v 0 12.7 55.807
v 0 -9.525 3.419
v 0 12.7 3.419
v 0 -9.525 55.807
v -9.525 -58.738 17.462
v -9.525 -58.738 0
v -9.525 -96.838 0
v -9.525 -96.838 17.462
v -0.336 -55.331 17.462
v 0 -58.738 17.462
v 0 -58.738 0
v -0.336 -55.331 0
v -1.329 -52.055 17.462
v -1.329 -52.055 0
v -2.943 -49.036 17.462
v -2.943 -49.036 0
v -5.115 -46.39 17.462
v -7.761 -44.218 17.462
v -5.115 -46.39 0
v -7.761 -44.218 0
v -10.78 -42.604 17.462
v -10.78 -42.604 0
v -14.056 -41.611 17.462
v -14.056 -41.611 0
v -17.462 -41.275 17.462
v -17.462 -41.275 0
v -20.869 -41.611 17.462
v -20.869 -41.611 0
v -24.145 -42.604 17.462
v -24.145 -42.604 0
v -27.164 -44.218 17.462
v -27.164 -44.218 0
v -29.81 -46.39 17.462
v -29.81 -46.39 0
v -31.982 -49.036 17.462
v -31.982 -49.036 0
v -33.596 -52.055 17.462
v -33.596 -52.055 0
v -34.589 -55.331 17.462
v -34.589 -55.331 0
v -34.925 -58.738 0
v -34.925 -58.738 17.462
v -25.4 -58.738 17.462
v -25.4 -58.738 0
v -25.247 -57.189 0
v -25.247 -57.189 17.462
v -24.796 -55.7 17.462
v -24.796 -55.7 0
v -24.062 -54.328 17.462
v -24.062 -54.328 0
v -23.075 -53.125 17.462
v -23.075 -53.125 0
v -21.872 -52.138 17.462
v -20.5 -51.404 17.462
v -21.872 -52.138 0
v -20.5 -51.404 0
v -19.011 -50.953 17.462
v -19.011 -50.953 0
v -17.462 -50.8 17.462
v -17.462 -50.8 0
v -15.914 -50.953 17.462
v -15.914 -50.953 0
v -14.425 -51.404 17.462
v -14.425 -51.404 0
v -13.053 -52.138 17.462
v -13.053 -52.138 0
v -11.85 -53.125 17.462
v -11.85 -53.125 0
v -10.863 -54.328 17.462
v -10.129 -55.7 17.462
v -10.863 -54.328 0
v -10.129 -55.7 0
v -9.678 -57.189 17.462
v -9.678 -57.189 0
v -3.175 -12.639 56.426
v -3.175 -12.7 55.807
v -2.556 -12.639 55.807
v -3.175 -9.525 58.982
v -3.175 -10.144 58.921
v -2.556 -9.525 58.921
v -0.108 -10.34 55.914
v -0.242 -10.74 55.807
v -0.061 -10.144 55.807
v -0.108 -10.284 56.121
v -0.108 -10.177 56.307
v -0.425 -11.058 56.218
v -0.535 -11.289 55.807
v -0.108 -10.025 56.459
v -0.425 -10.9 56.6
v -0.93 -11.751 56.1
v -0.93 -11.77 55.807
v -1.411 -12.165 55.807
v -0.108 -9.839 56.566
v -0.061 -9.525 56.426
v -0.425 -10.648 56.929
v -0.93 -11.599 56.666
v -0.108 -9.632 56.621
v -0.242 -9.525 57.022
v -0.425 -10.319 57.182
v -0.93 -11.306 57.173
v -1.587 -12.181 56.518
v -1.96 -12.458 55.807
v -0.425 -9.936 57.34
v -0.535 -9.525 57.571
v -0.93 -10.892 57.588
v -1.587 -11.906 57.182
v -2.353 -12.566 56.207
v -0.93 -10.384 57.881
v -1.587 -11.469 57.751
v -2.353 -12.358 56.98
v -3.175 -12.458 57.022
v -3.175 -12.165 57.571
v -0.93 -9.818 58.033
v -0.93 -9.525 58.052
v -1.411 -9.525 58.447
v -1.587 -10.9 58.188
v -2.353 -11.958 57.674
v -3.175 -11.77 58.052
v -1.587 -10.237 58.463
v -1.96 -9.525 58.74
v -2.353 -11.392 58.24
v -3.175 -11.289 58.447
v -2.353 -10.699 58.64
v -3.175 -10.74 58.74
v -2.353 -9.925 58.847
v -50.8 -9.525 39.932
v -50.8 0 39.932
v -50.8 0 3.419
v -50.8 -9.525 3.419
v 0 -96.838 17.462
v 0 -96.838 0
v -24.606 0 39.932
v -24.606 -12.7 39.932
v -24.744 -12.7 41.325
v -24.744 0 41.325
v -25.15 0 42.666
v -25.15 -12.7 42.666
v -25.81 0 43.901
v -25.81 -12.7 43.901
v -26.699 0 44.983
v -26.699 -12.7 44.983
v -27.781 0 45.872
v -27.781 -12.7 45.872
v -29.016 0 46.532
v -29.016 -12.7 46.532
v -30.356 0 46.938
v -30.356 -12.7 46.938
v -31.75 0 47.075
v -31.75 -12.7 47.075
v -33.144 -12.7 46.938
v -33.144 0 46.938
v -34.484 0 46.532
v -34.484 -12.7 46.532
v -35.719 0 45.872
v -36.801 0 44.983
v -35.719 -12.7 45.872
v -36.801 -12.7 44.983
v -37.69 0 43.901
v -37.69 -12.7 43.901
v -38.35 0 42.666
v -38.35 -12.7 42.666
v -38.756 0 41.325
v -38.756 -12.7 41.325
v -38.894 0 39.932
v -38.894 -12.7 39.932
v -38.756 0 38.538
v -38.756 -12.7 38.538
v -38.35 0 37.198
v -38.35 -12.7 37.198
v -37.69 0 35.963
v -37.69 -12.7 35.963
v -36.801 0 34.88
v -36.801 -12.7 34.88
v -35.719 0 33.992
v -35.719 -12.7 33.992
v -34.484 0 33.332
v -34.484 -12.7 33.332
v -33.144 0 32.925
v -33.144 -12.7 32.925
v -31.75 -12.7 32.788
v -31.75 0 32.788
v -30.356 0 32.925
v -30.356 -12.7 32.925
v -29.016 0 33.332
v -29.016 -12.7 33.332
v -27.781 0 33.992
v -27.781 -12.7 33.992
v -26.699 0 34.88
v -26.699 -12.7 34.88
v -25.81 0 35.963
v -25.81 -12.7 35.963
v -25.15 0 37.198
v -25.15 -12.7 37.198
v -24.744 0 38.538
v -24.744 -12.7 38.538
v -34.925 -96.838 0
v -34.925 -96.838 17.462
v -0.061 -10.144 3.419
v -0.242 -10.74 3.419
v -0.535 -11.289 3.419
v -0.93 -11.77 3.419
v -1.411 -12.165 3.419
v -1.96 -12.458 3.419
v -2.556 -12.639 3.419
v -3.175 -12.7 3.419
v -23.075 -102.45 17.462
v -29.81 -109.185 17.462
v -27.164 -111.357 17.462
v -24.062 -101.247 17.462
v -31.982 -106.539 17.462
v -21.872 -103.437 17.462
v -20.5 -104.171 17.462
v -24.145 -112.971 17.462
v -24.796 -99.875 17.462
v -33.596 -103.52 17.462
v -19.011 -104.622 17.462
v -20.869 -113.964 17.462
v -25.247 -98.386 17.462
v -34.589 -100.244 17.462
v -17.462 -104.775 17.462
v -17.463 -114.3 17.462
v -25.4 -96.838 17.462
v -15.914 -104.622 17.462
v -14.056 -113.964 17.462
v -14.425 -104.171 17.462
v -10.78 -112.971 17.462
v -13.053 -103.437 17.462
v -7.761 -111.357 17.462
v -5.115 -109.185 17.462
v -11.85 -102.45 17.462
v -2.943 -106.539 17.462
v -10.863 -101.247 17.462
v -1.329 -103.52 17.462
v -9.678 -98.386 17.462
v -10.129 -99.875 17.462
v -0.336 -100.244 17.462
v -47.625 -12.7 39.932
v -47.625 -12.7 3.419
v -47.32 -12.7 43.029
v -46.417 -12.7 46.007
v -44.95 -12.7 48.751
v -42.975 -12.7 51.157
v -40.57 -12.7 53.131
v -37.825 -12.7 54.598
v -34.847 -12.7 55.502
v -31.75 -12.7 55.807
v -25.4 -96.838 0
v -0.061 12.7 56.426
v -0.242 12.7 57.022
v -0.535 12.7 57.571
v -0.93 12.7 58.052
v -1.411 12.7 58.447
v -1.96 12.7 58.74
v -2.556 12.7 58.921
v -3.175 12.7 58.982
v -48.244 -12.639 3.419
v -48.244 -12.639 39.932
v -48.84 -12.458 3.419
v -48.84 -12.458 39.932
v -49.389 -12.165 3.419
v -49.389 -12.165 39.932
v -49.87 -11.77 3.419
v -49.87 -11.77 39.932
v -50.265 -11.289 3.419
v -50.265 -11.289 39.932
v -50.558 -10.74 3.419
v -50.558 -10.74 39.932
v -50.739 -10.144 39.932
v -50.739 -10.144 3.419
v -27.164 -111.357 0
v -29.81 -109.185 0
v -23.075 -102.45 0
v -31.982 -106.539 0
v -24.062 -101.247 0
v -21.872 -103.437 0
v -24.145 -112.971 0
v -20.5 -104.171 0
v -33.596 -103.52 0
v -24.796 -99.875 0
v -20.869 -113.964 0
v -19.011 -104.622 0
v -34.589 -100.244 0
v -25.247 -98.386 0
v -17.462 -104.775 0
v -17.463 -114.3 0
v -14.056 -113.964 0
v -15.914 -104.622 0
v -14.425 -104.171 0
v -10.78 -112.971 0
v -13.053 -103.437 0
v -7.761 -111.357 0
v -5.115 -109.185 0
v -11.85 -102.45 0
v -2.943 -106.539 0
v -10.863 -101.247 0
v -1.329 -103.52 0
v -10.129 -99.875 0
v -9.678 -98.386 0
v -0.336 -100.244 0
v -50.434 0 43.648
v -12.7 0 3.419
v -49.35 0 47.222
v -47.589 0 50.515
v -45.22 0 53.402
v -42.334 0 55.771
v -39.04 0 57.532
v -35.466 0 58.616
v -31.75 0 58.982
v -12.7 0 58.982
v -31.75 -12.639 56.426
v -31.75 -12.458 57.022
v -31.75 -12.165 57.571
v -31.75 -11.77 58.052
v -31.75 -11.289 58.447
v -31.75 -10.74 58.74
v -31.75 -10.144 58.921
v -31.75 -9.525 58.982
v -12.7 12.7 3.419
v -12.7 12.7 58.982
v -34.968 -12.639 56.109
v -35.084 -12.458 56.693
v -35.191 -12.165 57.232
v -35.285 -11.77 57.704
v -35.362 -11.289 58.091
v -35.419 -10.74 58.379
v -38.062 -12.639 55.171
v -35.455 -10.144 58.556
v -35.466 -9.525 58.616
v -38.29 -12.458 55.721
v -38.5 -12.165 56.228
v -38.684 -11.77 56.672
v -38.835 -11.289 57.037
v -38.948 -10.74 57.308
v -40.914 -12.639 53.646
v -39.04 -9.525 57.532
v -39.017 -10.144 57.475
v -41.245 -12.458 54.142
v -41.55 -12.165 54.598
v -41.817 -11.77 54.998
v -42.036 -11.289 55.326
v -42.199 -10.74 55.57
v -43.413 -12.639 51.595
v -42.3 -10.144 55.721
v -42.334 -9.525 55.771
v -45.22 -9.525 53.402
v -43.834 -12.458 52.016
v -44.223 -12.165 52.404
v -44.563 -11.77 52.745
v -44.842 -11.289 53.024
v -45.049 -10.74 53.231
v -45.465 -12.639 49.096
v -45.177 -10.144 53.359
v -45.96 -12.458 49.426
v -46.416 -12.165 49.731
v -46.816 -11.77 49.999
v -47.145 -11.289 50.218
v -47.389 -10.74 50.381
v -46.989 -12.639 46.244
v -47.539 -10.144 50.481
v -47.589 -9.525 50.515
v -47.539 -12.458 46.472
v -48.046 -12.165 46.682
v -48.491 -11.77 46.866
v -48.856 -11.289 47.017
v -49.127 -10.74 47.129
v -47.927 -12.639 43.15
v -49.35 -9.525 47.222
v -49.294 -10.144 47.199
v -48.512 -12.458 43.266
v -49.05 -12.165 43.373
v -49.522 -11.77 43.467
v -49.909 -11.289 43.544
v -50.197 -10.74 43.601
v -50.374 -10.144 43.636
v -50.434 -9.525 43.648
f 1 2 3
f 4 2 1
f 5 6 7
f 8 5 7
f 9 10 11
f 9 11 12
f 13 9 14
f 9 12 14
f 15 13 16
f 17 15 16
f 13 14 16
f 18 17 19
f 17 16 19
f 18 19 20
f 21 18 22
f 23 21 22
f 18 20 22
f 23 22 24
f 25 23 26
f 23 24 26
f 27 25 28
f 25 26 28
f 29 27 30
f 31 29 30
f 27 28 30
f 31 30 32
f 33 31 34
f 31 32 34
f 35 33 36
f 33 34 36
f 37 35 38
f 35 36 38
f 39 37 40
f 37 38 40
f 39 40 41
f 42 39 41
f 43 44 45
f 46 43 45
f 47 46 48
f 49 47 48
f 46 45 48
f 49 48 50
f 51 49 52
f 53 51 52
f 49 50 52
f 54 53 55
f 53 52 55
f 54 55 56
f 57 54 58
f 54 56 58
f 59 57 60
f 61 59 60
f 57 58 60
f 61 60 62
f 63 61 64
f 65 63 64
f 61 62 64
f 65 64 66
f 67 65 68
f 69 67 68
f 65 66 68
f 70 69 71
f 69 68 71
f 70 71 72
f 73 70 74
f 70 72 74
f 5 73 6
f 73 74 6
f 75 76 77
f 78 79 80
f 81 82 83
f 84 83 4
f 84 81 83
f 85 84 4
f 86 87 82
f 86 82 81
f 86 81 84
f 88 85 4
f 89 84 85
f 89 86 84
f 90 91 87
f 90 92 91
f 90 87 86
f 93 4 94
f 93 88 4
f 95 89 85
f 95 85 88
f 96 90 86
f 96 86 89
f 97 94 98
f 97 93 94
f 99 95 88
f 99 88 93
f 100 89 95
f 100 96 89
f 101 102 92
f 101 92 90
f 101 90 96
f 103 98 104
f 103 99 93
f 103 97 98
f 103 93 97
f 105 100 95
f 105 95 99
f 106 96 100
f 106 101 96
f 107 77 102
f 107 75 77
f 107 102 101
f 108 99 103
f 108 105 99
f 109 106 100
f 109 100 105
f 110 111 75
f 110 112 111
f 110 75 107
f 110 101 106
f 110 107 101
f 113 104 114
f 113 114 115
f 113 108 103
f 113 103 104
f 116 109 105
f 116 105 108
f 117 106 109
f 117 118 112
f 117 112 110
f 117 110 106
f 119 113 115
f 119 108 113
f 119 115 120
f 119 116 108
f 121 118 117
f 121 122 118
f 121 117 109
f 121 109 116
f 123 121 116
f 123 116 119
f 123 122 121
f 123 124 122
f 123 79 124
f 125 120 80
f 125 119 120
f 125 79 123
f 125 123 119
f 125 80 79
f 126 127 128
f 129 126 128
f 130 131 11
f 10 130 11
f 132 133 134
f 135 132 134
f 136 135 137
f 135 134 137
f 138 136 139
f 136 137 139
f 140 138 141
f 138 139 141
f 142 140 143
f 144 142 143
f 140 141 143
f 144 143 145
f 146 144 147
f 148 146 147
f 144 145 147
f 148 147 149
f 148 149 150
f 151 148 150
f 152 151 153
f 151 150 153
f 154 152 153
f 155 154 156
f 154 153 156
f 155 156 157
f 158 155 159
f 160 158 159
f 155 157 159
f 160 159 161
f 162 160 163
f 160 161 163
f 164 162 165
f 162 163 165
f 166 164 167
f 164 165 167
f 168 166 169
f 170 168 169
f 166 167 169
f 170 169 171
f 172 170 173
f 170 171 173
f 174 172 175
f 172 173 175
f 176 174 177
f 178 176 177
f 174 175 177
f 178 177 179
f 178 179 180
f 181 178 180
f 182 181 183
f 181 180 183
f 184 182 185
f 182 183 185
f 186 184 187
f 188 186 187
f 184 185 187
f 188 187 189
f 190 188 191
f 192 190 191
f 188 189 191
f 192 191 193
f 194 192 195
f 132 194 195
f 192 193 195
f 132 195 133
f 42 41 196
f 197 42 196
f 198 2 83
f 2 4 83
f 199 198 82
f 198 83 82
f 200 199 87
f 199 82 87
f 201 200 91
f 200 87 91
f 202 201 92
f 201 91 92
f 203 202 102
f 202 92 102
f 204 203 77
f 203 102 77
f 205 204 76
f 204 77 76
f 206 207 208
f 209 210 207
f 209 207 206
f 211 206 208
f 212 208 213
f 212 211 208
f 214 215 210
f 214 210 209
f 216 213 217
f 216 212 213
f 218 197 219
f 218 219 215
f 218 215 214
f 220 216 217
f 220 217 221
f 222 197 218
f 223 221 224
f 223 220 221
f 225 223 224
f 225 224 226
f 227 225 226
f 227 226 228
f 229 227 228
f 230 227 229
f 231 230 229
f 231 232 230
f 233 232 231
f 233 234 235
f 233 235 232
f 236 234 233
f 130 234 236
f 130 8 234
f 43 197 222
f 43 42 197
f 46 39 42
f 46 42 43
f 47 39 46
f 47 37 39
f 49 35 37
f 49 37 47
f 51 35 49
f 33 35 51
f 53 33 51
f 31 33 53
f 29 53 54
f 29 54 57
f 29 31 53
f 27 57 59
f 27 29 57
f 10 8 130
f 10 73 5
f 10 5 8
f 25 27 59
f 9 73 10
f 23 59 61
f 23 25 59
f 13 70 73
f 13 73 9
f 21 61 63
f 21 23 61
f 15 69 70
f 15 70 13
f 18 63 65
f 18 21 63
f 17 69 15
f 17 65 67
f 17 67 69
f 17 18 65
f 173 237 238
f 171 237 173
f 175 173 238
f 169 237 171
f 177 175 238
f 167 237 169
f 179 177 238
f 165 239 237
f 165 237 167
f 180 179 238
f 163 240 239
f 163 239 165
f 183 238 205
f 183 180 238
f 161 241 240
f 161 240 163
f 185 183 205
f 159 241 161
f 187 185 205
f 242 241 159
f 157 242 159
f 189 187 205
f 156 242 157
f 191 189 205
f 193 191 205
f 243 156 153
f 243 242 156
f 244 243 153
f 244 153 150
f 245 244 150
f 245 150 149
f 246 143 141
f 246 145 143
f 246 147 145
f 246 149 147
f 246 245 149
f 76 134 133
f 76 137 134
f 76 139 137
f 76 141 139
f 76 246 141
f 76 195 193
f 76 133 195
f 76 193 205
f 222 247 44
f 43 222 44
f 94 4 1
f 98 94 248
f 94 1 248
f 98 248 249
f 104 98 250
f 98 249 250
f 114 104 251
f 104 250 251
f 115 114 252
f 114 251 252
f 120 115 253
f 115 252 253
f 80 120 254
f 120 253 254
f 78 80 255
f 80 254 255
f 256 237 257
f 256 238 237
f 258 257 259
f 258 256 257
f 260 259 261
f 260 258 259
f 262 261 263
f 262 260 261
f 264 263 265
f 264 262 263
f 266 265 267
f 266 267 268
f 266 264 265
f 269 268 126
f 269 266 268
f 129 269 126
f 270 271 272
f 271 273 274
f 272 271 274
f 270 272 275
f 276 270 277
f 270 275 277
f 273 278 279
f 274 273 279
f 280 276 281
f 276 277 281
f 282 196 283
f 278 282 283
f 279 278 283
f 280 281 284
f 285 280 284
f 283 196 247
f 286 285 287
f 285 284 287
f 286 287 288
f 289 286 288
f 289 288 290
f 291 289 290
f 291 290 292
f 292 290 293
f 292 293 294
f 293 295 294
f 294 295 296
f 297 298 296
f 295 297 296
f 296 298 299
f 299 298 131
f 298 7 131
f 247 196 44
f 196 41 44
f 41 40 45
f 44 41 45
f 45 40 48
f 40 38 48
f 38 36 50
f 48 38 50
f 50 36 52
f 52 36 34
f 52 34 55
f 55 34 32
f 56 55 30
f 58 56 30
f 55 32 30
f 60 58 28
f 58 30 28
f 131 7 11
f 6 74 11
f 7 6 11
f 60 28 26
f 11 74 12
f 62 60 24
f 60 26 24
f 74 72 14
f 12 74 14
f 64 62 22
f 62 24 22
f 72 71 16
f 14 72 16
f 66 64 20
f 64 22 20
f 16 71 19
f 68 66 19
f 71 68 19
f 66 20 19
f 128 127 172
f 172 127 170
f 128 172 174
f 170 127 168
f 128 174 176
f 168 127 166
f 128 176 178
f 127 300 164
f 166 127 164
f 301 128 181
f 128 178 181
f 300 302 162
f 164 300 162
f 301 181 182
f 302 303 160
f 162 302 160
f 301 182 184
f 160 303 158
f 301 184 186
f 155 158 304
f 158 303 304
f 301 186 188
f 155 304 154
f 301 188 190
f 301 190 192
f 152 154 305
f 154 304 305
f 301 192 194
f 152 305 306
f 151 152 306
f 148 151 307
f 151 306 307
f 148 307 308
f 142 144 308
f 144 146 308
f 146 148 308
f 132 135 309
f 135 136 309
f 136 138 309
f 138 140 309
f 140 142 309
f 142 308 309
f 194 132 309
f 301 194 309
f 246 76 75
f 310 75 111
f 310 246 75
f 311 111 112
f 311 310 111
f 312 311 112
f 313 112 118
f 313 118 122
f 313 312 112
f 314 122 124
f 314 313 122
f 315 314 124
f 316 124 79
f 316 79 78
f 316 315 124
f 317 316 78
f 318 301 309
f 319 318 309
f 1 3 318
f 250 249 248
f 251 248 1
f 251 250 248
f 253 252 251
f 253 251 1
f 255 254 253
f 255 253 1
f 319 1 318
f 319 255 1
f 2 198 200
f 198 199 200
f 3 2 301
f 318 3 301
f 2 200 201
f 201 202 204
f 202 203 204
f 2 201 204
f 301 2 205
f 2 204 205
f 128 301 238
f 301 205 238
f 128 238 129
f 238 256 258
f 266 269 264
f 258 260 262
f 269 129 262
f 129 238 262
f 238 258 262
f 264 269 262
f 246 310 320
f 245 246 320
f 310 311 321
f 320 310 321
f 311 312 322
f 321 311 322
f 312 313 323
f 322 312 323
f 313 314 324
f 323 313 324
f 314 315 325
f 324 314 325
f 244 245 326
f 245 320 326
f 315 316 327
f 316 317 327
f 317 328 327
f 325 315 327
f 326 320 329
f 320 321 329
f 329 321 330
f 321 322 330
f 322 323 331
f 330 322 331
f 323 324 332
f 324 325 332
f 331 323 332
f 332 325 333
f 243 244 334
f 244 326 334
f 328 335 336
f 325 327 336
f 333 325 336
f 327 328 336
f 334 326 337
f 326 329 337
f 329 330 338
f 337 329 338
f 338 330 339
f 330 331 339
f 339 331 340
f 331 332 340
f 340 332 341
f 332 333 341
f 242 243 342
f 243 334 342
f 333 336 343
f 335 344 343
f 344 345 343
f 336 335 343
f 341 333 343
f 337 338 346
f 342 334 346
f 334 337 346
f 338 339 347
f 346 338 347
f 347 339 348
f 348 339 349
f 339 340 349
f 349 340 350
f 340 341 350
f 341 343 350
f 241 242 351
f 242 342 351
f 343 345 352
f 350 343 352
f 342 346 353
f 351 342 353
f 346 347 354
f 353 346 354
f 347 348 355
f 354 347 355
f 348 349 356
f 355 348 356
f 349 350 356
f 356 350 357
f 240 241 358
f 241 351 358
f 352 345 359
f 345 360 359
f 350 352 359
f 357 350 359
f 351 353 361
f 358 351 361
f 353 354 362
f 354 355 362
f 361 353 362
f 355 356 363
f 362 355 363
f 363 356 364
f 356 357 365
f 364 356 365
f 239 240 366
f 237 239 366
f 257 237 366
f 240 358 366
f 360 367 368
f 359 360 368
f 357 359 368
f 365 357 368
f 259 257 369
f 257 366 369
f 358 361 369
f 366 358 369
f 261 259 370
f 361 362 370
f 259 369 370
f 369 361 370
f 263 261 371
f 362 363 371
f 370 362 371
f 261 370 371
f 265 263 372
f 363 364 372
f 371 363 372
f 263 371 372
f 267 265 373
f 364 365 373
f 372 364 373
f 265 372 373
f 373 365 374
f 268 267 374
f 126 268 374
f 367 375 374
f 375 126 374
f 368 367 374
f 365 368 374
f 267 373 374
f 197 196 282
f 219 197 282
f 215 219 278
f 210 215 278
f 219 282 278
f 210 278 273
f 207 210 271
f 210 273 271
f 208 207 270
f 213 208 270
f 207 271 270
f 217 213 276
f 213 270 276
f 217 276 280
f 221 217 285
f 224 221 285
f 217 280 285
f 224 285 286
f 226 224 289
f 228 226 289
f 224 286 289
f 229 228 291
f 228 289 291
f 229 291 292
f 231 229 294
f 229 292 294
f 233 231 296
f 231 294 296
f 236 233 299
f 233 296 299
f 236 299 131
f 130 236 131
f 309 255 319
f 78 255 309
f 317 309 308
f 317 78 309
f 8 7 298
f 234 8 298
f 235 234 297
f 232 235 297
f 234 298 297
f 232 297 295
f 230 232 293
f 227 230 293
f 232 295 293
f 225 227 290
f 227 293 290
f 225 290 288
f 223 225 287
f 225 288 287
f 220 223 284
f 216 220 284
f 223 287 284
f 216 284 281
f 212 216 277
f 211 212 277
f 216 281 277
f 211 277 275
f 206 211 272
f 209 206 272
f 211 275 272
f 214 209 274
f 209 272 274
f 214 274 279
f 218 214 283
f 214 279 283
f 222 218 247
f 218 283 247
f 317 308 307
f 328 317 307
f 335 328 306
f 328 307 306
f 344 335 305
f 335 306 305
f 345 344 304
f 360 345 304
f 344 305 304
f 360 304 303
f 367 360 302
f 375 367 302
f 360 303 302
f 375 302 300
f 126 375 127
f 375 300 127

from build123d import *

# Parameters (mm, degrees)
F1_DEPTH = 12.7
F2_W     = 12.7
F2_H     = 55.5625
F3_DEPTH = 12.7
F5_R     = 7.14375
F6_DEPTH = 12.7
F7_R     = 3.175
F8_R     = 3.175
F9_DEPTH = 17.4625


with BuildPart() as f1:
    # F0 (on Front) → F1 (new body)
    with BuildSketch(Plane.XZ):
        with BuildLine():
            Line((0, 58.981731), (-31.75, 58.981731))
            ThreePointArc((-31.75, 58.981731), (-45.220384, 53.402115), (-50.8, 39.931731))
            Line((-50.8, 39.931731), (-50.8, 3.419231))
            Line((-50.8, 3.419231), (0, 3.419231))
            Line((0, 3.419231), (0, 58.981731))
        make_face()
    extrude(amount=F1_DEPTH)

    # F2 (on face) → F3 (join)
    with BuildSketch(Plane(origin=(0, 0, 0), x_dir=(-1, 0, 0), z_dir=(0, 1, 0))):
        with Locations((6.35, 31.200481)):
            Rectangle(F2_W, F2_H)
    extrude(amount=F3_DEPTH)

    # F5 (on face) → F6 (cut)
    with BuildSketch(Plane.XZ.offset(12.7)):
        with Locations((-31.75, 39.931731)):
            Circle(F5_R)
    extrude(amount=-F6_DEPTH, mode=Mode.SUBTRACT)

    # F7
    f7_edges = [f1.edges().sort_by_distance(p)[0] for p in [
        (-45.220384, -12.7, 53.402115),
    ]]
    fillet(f7_edges, radius=F7_R)

    # F8
    f8_edges = [f1.edges().sort_by_distance(p)[0] for p in [
        (0, -12.7, 29.612981),
    ]]
    fillet(f8_edges, radius=F8_R)


with BuildPart() as f9:
    # F4 (on Top) → F9 (new body)
    with BuildSketch(Plane.XY):
        with BuildLine():
            Line((0, -96.8375), (0, -58.7375))
            ThreePointArc((0, -58.7375), (-17.4625, -41.275), (-34.925, -58.7375))
            Line((-34.925, -58.7375), (-34.925, -96.8375))
            ThreePointArc((-34.925, -96.8375), (-17.4625, -114.3), (0, -96.8375))
        make_face()
        with BuildLine():
            Line((-9.525, -58.7375), (-9.525, -96.8375))
            ThreePointArc((-9.525, -96.8375), (-17.4625, -104.775), (-25.4, -96.8375))
            Line((-25.4, -96.8375), (-25.4, -58.7375))
            ThreePointArc((-25.4, -58.7375), (-17.4625, -50.8), (-9.525, -58.7375))
        make_face(mode=Mode.SUBTRACT)
    extrude(amount=F9_DEPTH)


solid = Compound([f1.part, f9.part])
